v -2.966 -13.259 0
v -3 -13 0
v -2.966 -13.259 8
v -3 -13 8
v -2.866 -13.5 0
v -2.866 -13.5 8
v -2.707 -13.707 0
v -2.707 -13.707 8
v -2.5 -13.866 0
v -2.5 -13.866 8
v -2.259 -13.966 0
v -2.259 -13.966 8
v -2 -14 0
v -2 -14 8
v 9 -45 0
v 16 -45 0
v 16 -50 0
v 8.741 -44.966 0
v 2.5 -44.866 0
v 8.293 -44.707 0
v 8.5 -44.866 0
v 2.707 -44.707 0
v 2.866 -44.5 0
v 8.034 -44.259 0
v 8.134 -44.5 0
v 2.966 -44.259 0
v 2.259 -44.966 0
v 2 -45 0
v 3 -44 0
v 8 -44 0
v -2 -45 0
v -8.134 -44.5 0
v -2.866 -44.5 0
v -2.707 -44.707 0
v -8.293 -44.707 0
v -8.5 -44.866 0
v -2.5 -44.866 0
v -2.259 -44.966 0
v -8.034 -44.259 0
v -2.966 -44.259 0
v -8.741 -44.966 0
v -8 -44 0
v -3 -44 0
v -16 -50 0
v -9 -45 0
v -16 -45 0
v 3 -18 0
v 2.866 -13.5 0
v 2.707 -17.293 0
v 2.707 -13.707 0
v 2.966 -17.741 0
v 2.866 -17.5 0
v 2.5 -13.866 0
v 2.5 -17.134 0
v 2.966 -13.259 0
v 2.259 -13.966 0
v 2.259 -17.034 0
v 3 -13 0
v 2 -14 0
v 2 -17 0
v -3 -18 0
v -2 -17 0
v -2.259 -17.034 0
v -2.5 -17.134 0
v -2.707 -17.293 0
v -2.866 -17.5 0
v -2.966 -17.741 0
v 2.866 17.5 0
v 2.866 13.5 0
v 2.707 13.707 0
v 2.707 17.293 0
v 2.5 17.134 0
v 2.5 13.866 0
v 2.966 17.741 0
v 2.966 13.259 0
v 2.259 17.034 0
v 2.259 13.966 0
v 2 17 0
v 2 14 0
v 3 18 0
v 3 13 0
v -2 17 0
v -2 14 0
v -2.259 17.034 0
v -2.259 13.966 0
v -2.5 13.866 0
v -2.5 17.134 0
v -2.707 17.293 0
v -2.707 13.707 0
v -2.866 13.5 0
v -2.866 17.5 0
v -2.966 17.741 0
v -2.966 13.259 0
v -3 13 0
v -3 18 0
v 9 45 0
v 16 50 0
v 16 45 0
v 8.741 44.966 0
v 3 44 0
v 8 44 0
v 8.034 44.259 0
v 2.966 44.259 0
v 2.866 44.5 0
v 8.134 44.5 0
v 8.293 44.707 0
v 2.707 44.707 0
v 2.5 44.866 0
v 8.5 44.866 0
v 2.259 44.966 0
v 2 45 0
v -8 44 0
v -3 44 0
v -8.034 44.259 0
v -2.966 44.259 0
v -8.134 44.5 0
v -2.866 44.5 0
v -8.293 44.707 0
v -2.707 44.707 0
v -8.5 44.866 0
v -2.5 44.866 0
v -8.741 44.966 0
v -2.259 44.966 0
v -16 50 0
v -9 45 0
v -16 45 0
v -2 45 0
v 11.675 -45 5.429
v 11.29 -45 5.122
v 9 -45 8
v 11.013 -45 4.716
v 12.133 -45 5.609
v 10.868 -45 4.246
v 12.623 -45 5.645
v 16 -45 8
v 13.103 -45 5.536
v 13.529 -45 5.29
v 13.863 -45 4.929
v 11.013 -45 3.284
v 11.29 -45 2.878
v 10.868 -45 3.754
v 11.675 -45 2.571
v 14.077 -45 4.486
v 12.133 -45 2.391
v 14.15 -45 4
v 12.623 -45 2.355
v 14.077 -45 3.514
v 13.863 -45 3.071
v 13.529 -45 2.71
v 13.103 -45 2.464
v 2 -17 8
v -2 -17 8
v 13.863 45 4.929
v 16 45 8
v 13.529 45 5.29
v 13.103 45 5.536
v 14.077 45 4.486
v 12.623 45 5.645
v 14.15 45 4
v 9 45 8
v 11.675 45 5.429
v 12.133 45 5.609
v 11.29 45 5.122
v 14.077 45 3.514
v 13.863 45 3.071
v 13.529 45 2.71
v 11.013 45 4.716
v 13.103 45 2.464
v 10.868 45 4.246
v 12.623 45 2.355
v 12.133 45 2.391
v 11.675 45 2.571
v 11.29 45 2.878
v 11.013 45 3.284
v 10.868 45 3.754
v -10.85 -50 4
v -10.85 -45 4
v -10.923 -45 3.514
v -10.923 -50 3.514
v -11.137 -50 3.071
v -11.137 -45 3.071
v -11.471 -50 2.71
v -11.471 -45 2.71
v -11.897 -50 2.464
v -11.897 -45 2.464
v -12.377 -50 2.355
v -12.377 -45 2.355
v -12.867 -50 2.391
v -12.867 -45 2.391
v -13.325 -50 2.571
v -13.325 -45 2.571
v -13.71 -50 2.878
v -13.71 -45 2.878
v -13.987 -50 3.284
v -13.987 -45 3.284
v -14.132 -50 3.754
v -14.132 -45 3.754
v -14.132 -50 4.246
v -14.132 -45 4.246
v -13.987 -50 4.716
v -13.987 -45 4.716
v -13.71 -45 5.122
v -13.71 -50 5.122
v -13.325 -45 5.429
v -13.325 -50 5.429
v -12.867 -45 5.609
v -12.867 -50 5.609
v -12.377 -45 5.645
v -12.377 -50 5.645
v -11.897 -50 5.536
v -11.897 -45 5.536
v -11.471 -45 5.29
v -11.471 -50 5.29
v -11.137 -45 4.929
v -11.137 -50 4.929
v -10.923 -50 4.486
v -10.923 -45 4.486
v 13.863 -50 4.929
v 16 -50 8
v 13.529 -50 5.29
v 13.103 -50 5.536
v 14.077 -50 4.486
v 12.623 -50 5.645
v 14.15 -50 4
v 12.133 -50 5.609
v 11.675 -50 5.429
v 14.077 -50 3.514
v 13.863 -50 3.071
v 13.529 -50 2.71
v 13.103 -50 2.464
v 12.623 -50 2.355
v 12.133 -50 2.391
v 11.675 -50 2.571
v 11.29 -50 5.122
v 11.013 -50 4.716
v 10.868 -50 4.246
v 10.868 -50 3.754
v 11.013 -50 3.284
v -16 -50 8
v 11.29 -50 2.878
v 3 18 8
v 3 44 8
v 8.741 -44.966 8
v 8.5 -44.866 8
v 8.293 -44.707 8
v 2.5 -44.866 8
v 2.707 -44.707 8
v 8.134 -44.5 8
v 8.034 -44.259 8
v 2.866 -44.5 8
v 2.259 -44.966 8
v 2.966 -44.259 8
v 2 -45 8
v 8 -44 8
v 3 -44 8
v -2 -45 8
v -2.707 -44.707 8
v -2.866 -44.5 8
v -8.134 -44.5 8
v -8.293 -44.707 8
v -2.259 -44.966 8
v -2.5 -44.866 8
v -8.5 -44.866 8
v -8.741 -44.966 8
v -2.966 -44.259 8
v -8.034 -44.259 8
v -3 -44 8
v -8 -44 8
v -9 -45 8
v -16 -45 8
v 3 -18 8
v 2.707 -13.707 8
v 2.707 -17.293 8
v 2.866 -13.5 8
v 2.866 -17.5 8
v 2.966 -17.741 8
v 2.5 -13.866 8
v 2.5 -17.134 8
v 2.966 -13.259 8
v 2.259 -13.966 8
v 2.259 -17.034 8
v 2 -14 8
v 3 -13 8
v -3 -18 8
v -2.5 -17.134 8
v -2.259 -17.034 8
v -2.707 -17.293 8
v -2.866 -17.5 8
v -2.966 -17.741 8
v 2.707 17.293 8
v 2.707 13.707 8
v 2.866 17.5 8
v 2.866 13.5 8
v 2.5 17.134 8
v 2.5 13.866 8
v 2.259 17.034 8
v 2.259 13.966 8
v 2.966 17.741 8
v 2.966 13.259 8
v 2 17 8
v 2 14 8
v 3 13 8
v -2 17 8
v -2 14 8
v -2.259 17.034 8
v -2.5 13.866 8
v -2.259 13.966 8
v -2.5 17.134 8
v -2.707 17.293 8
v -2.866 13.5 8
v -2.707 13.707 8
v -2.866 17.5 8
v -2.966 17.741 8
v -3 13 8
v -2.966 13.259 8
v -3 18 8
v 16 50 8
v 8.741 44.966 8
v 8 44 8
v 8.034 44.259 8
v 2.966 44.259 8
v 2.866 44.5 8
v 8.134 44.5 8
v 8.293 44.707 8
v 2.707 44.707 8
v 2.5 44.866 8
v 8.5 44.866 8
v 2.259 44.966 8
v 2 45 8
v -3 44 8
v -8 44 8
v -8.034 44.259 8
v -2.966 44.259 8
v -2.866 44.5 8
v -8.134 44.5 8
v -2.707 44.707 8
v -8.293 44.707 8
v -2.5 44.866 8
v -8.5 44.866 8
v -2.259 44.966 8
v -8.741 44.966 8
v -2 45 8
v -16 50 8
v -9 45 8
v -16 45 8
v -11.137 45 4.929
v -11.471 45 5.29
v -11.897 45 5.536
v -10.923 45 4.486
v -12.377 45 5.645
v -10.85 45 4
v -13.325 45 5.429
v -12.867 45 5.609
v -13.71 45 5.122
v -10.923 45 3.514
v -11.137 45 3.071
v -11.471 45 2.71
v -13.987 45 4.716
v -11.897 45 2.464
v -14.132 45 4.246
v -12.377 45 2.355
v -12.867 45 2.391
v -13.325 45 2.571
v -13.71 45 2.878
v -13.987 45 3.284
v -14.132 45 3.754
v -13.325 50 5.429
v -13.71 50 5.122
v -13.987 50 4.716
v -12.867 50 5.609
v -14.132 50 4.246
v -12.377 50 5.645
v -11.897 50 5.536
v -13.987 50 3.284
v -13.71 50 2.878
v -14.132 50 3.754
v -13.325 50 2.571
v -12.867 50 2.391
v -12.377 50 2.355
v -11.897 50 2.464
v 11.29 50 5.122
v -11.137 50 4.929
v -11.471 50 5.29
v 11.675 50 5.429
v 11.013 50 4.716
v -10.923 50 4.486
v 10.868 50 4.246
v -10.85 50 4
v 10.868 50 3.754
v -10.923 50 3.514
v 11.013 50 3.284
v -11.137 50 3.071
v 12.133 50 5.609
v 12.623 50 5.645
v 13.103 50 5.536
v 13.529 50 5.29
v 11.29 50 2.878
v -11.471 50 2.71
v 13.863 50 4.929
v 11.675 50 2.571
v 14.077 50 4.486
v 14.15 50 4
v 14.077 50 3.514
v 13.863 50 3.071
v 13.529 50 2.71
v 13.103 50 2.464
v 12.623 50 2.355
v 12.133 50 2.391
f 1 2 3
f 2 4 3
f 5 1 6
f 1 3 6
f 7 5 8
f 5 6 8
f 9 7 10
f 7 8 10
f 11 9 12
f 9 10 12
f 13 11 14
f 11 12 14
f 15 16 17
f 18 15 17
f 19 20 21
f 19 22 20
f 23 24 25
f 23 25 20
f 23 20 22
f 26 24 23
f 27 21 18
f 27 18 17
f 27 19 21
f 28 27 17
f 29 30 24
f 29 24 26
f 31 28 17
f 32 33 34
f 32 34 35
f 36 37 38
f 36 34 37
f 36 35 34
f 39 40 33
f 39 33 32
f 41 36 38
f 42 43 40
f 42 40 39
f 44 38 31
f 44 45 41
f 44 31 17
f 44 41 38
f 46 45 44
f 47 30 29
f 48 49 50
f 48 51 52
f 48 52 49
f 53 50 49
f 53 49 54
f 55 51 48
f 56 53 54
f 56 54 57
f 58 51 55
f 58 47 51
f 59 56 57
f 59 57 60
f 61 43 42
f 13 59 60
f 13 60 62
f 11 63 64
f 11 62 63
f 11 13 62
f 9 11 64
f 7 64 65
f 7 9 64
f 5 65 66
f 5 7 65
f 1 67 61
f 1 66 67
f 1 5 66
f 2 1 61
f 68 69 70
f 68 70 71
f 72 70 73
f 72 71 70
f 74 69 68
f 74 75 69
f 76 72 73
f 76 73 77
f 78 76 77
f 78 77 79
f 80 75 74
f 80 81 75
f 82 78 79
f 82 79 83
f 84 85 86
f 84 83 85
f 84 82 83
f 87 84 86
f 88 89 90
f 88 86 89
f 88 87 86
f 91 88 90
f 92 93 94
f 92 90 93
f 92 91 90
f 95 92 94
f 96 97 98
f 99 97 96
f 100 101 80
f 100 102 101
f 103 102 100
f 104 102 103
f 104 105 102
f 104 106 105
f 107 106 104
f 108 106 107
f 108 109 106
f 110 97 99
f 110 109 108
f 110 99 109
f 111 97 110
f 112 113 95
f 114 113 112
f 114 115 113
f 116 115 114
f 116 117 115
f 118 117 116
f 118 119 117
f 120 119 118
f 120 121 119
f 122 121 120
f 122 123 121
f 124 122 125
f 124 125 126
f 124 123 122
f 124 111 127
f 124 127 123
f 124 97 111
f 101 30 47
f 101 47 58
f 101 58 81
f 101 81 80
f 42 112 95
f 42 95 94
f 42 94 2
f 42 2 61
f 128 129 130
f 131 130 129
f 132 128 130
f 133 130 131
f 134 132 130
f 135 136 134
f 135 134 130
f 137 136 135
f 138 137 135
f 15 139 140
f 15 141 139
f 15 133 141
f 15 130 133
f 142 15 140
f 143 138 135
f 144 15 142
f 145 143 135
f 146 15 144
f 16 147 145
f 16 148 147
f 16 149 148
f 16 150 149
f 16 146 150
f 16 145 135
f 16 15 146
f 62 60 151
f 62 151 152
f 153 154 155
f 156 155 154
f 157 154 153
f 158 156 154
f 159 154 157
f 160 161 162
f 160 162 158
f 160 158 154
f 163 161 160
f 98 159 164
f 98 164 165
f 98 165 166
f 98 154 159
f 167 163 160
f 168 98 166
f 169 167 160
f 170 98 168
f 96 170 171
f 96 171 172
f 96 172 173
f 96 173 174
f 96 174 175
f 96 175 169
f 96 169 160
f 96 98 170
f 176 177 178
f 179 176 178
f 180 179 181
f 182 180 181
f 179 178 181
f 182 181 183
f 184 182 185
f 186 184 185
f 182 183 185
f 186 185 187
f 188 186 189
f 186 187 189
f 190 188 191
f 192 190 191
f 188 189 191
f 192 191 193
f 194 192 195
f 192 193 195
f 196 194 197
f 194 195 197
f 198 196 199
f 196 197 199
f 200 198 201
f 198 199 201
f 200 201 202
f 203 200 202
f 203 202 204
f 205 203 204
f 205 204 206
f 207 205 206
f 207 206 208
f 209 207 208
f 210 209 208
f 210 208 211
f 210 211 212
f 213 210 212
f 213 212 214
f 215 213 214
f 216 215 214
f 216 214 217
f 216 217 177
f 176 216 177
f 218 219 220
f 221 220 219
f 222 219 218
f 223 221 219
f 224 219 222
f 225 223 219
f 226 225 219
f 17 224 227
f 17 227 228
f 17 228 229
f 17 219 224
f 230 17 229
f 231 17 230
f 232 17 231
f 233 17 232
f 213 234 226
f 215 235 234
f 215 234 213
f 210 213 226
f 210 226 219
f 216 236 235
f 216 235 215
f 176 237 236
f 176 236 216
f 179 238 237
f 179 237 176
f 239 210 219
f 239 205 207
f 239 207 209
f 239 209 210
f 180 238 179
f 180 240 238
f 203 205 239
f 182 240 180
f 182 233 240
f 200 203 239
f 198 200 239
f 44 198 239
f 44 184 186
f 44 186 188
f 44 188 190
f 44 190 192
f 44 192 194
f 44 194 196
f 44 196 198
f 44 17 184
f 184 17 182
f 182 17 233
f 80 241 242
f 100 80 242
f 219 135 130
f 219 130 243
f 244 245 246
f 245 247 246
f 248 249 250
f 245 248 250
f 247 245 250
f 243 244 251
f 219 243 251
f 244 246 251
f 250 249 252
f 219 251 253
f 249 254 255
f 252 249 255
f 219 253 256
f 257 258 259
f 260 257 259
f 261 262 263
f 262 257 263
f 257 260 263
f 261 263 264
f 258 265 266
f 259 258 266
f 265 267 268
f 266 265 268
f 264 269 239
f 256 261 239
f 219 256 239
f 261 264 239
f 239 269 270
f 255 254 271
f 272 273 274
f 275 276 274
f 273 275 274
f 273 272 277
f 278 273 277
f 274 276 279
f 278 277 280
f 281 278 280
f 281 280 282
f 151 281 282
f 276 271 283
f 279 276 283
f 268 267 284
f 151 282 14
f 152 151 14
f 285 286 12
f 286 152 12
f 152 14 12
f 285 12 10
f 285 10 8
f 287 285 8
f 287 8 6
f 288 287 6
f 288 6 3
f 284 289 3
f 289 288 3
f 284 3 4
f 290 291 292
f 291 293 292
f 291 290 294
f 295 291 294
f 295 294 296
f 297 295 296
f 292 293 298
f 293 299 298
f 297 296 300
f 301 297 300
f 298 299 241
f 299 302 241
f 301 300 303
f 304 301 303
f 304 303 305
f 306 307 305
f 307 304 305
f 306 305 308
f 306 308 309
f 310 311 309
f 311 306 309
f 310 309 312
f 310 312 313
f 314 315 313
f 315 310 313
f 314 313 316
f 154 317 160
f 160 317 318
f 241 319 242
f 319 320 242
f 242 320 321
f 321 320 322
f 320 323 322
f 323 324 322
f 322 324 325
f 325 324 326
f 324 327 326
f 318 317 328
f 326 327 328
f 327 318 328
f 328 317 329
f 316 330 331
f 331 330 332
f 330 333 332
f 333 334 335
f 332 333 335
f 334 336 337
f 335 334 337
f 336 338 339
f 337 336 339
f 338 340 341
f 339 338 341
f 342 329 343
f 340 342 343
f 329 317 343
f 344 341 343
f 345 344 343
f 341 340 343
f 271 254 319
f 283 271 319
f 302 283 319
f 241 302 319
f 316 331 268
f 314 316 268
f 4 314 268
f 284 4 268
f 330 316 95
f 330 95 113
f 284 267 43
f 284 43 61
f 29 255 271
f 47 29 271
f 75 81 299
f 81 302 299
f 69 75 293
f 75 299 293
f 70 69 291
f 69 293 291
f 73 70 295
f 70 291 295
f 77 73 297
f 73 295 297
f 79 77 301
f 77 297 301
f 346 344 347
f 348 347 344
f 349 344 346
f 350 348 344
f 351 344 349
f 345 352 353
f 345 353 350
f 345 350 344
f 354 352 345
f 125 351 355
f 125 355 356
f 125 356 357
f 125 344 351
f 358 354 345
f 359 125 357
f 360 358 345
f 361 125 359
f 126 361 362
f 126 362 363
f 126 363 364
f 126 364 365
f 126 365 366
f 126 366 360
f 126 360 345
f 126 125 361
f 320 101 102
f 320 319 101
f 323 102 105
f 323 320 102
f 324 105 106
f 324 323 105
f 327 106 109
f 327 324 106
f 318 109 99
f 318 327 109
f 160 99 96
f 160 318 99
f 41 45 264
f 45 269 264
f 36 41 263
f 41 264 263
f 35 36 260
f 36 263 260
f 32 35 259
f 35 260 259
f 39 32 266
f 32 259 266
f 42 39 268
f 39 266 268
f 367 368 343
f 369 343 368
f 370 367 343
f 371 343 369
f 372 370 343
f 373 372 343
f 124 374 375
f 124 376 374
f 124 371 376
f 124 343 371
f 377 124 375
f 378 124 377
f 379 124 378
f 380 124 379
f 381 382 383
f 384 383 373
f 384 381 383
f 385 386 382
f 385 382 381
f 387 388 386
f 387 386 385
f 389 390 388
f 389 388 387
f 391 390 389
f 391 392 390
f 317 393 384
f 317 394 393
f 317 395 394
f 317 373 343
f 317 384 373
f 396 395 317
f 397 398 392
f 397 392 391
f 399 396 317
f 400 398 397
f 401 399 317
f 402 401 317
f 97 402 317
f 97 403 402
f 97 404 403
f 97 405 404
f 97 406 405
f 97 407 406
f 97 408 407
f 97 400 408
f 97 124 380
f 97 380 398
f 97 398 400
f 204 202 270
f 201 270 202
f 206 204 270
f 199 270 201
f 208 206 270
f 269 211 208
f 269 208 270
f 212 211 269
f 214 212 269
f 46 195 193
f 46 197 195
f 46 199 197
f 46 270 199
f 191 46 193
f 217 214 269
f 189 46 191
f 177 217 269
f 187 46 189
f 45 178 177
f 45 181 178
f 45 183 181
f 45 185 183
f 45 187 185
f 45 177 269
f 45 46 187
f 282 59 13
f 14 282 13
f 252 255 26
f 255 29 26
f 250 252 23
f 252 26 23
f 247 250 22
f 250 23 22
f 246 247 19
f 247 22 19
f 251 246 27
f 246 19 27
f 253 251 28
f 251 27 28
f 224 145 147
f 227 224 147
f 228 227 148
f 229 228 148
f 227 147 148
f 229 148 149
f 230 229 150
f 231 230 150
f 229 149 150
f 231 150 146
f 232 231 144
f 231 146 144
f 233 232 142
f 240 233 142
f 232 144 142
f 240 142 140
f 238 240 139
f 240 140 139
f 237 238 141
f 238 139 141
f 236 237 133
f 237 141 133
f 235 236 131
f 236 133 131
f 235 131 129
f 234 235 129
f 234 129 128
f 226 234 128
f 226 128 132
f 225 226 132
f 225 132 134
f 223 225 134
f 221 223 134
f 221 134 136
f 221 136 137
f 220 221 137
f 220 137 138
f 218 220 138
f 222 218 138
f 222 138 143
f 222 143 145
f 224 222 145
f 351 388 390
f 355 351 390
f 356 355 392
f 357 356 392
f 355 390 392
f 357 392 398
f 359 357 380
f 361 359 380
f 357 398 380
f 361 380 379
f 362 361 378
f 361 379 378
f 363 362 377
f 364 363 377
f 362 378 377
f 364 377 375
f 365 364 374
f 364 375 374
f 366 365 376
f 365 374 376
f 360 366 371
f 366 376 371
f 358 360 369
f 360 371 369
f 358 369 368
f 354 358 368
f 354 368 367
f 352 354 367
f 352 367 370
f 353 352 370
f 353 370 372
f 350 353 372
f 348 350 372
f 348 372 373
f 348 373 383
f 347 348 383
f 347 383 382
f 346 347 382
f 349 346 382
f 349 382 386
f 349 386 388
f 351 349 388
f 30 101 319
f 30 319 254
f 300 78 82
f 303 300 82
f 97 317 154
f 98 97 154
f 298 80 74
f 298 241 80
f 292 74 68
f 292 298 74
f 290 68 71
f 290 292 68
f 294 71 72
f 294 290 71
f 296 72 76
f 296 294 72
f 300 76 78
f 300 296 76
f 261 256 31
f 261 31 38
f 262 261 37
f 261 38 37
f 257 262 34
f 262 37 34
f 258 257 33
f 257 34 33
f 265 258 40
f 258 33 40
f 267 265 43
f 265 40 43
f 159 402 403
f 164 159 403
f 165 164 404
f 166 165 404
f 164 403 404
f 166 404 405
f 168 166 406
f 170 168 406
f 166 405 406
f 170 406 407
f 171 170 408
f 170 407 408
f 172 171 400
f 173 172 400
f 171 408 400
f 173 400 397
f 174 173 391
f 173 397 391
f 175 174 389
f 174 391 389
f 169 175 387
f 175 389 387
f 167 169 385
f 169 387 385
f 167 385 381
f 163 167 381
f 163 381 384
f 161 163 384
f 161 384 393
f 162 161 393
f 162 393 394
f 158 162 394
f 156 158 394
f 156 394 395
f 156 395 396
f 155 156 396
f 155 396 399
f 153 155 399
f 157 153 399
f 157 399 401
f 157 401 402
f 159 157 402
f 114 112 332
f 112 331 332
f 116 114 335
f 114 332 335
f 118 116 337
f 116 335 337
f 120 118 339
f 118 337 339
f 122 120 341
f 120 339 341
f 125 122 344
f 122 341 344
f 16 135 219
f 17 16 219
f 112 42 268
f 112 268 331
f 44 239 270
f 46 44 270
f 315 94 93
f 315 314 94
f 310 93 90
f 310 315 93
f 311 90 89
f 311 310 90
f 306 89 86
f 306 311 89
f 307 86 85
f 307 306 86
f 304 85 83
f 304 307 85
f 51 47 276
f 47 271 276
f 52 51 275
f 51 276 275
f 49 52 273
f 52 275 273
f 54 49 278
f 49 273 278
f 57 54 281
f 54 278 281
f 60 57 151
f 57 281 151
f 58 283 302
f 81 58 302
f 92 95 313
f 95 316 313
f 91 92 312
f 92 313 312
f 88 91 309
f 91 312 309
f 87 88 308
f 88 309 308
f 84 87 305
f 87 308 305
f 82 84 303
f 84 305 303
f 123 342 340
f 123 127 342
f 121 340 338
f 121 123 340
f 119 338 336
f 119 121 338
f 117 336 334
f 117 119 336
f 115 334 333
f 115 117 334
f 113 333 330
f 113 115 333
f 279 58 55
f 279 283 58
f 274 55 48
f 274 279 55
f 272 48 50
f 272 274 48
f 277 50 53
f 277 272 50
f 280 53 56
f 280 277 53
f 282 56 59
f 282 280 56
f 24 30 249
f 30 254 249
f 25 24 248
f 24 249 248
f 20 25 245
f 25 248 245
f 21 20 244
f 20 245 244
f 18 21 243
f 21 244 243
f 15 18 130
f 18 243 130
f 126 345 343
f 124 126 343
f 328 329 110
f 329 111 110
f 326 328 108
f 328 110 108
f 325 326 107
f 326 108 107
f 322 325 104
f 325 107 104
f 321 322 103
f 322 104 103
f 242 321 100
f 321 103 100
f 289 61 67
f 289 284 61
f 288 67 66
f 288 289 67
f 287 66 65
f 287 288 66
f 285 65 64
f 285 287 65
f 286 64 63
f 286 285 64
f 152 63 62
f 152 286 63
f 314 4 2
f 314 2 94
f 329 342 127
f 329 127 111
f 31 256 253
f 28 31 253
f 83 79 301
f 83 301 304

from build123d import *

# Parameters (mm, degrees)
EXTRUDE_1_DEPTH     = 8
FILLET_1_R          = 1
SKETCH_3_W          = 6
SKETCH_3_H          = 90
CUT_EXTRUDE_2_DEPTH = 10
FILLET_2_R          = 1
HOLE_WIZARD_M4_1_D  = 3.3
SKETCH_6_W          = 6
SKETCH_6_H          = 3
EXTRUDE_2_DEPTH     = 8
FILLET_3_R          = 1


with BuildPart() as part:
    # 草图1 → 凸台-拉伸1 (new body)
    with BuildSketch(Plane.XY):
        Polygon((8, 45), (8, -45), (16, -45), (16, -50), (-16, -50), (-16, -45), (-8, -45), (-8, 45), (-16, 45), (-16, 50), (16, 50), (16, 45), align=None)
    extrude(amount=EXTRUDE_1_DEPTH)

    # 圆角1
    fillet_1_edges = [part.edges().sort_by_distance(p)[0] for p in [
        (8, -45, 4),
        (-8, -45, 4),
        (-8, 45, 4),
        (8, 45, 4),
    ]]
    fillet(fillet_1_edges, radius=FILLET_1_R)

    # 草图3 → 切除-拉伸2 (cut)
    with BuildSketch(Plane.XY.offset(8)):
        Rectangle(SKETCH_3_W, SKETCH_3_H)
    extrude(amount=-CUT_EXTRUDE_2_DEPTH, mode=Mode.SUBTRACT)

    # 圆角2
    fillet_2_edges = [part.edges().sort_by_distance(p)[0] for p in [
        (3, 45, 4),
        (3, -45, 4),
        (-3, -45, 4),
        (-3, 45, 4),
    ]]
    fillet(fillet_2_edges, radius=FILLET_2_R)

    # M4 螺纹孔的螺纹孔钻头1 (through all)
    with Locations(Plane(origin=(0, -50, 0), x_dir=(-1, 0, 0), z_dir=(0, -1, 0))):
        with Locations((-12.5, -4), (12.5, -4)):
            Hole(HOLE_WIZARD_M4_1_D / 2)

    # 草图6 → 凸台-拉伸2 (add)
    with BuildSketch(Plane(origin=(0, 0, 0), x_dir=(-1, 0, 0), z_dir=(0, 0, -1))):
        with Locations((0, 15.5)):
            Rectangle(SKETCH_6_W, SKETCH_6_H)
        with Locations((0, -15.5)):
            Rectangle(SKETCH_6_W, SKETCH_6_H)
    extrude(amount=-EXTRUDE_2_DEPTH)

    # 圆角3
    fillet_3_edges = [part.edges().sort_by_distance(p)[0] for p in [
        (3, 17, 4),
        (3, 14, 4),
        (-3, 14, 4),
        (-3, 17, 4),
        (3, -14, 4),
        (3, -17, 4),
        (-3, -17, 4),
        (-3, -14, 4),
    ]]
    fillet(fillet_3_edges, radius=FILLET_3_R)


solid = part.part
